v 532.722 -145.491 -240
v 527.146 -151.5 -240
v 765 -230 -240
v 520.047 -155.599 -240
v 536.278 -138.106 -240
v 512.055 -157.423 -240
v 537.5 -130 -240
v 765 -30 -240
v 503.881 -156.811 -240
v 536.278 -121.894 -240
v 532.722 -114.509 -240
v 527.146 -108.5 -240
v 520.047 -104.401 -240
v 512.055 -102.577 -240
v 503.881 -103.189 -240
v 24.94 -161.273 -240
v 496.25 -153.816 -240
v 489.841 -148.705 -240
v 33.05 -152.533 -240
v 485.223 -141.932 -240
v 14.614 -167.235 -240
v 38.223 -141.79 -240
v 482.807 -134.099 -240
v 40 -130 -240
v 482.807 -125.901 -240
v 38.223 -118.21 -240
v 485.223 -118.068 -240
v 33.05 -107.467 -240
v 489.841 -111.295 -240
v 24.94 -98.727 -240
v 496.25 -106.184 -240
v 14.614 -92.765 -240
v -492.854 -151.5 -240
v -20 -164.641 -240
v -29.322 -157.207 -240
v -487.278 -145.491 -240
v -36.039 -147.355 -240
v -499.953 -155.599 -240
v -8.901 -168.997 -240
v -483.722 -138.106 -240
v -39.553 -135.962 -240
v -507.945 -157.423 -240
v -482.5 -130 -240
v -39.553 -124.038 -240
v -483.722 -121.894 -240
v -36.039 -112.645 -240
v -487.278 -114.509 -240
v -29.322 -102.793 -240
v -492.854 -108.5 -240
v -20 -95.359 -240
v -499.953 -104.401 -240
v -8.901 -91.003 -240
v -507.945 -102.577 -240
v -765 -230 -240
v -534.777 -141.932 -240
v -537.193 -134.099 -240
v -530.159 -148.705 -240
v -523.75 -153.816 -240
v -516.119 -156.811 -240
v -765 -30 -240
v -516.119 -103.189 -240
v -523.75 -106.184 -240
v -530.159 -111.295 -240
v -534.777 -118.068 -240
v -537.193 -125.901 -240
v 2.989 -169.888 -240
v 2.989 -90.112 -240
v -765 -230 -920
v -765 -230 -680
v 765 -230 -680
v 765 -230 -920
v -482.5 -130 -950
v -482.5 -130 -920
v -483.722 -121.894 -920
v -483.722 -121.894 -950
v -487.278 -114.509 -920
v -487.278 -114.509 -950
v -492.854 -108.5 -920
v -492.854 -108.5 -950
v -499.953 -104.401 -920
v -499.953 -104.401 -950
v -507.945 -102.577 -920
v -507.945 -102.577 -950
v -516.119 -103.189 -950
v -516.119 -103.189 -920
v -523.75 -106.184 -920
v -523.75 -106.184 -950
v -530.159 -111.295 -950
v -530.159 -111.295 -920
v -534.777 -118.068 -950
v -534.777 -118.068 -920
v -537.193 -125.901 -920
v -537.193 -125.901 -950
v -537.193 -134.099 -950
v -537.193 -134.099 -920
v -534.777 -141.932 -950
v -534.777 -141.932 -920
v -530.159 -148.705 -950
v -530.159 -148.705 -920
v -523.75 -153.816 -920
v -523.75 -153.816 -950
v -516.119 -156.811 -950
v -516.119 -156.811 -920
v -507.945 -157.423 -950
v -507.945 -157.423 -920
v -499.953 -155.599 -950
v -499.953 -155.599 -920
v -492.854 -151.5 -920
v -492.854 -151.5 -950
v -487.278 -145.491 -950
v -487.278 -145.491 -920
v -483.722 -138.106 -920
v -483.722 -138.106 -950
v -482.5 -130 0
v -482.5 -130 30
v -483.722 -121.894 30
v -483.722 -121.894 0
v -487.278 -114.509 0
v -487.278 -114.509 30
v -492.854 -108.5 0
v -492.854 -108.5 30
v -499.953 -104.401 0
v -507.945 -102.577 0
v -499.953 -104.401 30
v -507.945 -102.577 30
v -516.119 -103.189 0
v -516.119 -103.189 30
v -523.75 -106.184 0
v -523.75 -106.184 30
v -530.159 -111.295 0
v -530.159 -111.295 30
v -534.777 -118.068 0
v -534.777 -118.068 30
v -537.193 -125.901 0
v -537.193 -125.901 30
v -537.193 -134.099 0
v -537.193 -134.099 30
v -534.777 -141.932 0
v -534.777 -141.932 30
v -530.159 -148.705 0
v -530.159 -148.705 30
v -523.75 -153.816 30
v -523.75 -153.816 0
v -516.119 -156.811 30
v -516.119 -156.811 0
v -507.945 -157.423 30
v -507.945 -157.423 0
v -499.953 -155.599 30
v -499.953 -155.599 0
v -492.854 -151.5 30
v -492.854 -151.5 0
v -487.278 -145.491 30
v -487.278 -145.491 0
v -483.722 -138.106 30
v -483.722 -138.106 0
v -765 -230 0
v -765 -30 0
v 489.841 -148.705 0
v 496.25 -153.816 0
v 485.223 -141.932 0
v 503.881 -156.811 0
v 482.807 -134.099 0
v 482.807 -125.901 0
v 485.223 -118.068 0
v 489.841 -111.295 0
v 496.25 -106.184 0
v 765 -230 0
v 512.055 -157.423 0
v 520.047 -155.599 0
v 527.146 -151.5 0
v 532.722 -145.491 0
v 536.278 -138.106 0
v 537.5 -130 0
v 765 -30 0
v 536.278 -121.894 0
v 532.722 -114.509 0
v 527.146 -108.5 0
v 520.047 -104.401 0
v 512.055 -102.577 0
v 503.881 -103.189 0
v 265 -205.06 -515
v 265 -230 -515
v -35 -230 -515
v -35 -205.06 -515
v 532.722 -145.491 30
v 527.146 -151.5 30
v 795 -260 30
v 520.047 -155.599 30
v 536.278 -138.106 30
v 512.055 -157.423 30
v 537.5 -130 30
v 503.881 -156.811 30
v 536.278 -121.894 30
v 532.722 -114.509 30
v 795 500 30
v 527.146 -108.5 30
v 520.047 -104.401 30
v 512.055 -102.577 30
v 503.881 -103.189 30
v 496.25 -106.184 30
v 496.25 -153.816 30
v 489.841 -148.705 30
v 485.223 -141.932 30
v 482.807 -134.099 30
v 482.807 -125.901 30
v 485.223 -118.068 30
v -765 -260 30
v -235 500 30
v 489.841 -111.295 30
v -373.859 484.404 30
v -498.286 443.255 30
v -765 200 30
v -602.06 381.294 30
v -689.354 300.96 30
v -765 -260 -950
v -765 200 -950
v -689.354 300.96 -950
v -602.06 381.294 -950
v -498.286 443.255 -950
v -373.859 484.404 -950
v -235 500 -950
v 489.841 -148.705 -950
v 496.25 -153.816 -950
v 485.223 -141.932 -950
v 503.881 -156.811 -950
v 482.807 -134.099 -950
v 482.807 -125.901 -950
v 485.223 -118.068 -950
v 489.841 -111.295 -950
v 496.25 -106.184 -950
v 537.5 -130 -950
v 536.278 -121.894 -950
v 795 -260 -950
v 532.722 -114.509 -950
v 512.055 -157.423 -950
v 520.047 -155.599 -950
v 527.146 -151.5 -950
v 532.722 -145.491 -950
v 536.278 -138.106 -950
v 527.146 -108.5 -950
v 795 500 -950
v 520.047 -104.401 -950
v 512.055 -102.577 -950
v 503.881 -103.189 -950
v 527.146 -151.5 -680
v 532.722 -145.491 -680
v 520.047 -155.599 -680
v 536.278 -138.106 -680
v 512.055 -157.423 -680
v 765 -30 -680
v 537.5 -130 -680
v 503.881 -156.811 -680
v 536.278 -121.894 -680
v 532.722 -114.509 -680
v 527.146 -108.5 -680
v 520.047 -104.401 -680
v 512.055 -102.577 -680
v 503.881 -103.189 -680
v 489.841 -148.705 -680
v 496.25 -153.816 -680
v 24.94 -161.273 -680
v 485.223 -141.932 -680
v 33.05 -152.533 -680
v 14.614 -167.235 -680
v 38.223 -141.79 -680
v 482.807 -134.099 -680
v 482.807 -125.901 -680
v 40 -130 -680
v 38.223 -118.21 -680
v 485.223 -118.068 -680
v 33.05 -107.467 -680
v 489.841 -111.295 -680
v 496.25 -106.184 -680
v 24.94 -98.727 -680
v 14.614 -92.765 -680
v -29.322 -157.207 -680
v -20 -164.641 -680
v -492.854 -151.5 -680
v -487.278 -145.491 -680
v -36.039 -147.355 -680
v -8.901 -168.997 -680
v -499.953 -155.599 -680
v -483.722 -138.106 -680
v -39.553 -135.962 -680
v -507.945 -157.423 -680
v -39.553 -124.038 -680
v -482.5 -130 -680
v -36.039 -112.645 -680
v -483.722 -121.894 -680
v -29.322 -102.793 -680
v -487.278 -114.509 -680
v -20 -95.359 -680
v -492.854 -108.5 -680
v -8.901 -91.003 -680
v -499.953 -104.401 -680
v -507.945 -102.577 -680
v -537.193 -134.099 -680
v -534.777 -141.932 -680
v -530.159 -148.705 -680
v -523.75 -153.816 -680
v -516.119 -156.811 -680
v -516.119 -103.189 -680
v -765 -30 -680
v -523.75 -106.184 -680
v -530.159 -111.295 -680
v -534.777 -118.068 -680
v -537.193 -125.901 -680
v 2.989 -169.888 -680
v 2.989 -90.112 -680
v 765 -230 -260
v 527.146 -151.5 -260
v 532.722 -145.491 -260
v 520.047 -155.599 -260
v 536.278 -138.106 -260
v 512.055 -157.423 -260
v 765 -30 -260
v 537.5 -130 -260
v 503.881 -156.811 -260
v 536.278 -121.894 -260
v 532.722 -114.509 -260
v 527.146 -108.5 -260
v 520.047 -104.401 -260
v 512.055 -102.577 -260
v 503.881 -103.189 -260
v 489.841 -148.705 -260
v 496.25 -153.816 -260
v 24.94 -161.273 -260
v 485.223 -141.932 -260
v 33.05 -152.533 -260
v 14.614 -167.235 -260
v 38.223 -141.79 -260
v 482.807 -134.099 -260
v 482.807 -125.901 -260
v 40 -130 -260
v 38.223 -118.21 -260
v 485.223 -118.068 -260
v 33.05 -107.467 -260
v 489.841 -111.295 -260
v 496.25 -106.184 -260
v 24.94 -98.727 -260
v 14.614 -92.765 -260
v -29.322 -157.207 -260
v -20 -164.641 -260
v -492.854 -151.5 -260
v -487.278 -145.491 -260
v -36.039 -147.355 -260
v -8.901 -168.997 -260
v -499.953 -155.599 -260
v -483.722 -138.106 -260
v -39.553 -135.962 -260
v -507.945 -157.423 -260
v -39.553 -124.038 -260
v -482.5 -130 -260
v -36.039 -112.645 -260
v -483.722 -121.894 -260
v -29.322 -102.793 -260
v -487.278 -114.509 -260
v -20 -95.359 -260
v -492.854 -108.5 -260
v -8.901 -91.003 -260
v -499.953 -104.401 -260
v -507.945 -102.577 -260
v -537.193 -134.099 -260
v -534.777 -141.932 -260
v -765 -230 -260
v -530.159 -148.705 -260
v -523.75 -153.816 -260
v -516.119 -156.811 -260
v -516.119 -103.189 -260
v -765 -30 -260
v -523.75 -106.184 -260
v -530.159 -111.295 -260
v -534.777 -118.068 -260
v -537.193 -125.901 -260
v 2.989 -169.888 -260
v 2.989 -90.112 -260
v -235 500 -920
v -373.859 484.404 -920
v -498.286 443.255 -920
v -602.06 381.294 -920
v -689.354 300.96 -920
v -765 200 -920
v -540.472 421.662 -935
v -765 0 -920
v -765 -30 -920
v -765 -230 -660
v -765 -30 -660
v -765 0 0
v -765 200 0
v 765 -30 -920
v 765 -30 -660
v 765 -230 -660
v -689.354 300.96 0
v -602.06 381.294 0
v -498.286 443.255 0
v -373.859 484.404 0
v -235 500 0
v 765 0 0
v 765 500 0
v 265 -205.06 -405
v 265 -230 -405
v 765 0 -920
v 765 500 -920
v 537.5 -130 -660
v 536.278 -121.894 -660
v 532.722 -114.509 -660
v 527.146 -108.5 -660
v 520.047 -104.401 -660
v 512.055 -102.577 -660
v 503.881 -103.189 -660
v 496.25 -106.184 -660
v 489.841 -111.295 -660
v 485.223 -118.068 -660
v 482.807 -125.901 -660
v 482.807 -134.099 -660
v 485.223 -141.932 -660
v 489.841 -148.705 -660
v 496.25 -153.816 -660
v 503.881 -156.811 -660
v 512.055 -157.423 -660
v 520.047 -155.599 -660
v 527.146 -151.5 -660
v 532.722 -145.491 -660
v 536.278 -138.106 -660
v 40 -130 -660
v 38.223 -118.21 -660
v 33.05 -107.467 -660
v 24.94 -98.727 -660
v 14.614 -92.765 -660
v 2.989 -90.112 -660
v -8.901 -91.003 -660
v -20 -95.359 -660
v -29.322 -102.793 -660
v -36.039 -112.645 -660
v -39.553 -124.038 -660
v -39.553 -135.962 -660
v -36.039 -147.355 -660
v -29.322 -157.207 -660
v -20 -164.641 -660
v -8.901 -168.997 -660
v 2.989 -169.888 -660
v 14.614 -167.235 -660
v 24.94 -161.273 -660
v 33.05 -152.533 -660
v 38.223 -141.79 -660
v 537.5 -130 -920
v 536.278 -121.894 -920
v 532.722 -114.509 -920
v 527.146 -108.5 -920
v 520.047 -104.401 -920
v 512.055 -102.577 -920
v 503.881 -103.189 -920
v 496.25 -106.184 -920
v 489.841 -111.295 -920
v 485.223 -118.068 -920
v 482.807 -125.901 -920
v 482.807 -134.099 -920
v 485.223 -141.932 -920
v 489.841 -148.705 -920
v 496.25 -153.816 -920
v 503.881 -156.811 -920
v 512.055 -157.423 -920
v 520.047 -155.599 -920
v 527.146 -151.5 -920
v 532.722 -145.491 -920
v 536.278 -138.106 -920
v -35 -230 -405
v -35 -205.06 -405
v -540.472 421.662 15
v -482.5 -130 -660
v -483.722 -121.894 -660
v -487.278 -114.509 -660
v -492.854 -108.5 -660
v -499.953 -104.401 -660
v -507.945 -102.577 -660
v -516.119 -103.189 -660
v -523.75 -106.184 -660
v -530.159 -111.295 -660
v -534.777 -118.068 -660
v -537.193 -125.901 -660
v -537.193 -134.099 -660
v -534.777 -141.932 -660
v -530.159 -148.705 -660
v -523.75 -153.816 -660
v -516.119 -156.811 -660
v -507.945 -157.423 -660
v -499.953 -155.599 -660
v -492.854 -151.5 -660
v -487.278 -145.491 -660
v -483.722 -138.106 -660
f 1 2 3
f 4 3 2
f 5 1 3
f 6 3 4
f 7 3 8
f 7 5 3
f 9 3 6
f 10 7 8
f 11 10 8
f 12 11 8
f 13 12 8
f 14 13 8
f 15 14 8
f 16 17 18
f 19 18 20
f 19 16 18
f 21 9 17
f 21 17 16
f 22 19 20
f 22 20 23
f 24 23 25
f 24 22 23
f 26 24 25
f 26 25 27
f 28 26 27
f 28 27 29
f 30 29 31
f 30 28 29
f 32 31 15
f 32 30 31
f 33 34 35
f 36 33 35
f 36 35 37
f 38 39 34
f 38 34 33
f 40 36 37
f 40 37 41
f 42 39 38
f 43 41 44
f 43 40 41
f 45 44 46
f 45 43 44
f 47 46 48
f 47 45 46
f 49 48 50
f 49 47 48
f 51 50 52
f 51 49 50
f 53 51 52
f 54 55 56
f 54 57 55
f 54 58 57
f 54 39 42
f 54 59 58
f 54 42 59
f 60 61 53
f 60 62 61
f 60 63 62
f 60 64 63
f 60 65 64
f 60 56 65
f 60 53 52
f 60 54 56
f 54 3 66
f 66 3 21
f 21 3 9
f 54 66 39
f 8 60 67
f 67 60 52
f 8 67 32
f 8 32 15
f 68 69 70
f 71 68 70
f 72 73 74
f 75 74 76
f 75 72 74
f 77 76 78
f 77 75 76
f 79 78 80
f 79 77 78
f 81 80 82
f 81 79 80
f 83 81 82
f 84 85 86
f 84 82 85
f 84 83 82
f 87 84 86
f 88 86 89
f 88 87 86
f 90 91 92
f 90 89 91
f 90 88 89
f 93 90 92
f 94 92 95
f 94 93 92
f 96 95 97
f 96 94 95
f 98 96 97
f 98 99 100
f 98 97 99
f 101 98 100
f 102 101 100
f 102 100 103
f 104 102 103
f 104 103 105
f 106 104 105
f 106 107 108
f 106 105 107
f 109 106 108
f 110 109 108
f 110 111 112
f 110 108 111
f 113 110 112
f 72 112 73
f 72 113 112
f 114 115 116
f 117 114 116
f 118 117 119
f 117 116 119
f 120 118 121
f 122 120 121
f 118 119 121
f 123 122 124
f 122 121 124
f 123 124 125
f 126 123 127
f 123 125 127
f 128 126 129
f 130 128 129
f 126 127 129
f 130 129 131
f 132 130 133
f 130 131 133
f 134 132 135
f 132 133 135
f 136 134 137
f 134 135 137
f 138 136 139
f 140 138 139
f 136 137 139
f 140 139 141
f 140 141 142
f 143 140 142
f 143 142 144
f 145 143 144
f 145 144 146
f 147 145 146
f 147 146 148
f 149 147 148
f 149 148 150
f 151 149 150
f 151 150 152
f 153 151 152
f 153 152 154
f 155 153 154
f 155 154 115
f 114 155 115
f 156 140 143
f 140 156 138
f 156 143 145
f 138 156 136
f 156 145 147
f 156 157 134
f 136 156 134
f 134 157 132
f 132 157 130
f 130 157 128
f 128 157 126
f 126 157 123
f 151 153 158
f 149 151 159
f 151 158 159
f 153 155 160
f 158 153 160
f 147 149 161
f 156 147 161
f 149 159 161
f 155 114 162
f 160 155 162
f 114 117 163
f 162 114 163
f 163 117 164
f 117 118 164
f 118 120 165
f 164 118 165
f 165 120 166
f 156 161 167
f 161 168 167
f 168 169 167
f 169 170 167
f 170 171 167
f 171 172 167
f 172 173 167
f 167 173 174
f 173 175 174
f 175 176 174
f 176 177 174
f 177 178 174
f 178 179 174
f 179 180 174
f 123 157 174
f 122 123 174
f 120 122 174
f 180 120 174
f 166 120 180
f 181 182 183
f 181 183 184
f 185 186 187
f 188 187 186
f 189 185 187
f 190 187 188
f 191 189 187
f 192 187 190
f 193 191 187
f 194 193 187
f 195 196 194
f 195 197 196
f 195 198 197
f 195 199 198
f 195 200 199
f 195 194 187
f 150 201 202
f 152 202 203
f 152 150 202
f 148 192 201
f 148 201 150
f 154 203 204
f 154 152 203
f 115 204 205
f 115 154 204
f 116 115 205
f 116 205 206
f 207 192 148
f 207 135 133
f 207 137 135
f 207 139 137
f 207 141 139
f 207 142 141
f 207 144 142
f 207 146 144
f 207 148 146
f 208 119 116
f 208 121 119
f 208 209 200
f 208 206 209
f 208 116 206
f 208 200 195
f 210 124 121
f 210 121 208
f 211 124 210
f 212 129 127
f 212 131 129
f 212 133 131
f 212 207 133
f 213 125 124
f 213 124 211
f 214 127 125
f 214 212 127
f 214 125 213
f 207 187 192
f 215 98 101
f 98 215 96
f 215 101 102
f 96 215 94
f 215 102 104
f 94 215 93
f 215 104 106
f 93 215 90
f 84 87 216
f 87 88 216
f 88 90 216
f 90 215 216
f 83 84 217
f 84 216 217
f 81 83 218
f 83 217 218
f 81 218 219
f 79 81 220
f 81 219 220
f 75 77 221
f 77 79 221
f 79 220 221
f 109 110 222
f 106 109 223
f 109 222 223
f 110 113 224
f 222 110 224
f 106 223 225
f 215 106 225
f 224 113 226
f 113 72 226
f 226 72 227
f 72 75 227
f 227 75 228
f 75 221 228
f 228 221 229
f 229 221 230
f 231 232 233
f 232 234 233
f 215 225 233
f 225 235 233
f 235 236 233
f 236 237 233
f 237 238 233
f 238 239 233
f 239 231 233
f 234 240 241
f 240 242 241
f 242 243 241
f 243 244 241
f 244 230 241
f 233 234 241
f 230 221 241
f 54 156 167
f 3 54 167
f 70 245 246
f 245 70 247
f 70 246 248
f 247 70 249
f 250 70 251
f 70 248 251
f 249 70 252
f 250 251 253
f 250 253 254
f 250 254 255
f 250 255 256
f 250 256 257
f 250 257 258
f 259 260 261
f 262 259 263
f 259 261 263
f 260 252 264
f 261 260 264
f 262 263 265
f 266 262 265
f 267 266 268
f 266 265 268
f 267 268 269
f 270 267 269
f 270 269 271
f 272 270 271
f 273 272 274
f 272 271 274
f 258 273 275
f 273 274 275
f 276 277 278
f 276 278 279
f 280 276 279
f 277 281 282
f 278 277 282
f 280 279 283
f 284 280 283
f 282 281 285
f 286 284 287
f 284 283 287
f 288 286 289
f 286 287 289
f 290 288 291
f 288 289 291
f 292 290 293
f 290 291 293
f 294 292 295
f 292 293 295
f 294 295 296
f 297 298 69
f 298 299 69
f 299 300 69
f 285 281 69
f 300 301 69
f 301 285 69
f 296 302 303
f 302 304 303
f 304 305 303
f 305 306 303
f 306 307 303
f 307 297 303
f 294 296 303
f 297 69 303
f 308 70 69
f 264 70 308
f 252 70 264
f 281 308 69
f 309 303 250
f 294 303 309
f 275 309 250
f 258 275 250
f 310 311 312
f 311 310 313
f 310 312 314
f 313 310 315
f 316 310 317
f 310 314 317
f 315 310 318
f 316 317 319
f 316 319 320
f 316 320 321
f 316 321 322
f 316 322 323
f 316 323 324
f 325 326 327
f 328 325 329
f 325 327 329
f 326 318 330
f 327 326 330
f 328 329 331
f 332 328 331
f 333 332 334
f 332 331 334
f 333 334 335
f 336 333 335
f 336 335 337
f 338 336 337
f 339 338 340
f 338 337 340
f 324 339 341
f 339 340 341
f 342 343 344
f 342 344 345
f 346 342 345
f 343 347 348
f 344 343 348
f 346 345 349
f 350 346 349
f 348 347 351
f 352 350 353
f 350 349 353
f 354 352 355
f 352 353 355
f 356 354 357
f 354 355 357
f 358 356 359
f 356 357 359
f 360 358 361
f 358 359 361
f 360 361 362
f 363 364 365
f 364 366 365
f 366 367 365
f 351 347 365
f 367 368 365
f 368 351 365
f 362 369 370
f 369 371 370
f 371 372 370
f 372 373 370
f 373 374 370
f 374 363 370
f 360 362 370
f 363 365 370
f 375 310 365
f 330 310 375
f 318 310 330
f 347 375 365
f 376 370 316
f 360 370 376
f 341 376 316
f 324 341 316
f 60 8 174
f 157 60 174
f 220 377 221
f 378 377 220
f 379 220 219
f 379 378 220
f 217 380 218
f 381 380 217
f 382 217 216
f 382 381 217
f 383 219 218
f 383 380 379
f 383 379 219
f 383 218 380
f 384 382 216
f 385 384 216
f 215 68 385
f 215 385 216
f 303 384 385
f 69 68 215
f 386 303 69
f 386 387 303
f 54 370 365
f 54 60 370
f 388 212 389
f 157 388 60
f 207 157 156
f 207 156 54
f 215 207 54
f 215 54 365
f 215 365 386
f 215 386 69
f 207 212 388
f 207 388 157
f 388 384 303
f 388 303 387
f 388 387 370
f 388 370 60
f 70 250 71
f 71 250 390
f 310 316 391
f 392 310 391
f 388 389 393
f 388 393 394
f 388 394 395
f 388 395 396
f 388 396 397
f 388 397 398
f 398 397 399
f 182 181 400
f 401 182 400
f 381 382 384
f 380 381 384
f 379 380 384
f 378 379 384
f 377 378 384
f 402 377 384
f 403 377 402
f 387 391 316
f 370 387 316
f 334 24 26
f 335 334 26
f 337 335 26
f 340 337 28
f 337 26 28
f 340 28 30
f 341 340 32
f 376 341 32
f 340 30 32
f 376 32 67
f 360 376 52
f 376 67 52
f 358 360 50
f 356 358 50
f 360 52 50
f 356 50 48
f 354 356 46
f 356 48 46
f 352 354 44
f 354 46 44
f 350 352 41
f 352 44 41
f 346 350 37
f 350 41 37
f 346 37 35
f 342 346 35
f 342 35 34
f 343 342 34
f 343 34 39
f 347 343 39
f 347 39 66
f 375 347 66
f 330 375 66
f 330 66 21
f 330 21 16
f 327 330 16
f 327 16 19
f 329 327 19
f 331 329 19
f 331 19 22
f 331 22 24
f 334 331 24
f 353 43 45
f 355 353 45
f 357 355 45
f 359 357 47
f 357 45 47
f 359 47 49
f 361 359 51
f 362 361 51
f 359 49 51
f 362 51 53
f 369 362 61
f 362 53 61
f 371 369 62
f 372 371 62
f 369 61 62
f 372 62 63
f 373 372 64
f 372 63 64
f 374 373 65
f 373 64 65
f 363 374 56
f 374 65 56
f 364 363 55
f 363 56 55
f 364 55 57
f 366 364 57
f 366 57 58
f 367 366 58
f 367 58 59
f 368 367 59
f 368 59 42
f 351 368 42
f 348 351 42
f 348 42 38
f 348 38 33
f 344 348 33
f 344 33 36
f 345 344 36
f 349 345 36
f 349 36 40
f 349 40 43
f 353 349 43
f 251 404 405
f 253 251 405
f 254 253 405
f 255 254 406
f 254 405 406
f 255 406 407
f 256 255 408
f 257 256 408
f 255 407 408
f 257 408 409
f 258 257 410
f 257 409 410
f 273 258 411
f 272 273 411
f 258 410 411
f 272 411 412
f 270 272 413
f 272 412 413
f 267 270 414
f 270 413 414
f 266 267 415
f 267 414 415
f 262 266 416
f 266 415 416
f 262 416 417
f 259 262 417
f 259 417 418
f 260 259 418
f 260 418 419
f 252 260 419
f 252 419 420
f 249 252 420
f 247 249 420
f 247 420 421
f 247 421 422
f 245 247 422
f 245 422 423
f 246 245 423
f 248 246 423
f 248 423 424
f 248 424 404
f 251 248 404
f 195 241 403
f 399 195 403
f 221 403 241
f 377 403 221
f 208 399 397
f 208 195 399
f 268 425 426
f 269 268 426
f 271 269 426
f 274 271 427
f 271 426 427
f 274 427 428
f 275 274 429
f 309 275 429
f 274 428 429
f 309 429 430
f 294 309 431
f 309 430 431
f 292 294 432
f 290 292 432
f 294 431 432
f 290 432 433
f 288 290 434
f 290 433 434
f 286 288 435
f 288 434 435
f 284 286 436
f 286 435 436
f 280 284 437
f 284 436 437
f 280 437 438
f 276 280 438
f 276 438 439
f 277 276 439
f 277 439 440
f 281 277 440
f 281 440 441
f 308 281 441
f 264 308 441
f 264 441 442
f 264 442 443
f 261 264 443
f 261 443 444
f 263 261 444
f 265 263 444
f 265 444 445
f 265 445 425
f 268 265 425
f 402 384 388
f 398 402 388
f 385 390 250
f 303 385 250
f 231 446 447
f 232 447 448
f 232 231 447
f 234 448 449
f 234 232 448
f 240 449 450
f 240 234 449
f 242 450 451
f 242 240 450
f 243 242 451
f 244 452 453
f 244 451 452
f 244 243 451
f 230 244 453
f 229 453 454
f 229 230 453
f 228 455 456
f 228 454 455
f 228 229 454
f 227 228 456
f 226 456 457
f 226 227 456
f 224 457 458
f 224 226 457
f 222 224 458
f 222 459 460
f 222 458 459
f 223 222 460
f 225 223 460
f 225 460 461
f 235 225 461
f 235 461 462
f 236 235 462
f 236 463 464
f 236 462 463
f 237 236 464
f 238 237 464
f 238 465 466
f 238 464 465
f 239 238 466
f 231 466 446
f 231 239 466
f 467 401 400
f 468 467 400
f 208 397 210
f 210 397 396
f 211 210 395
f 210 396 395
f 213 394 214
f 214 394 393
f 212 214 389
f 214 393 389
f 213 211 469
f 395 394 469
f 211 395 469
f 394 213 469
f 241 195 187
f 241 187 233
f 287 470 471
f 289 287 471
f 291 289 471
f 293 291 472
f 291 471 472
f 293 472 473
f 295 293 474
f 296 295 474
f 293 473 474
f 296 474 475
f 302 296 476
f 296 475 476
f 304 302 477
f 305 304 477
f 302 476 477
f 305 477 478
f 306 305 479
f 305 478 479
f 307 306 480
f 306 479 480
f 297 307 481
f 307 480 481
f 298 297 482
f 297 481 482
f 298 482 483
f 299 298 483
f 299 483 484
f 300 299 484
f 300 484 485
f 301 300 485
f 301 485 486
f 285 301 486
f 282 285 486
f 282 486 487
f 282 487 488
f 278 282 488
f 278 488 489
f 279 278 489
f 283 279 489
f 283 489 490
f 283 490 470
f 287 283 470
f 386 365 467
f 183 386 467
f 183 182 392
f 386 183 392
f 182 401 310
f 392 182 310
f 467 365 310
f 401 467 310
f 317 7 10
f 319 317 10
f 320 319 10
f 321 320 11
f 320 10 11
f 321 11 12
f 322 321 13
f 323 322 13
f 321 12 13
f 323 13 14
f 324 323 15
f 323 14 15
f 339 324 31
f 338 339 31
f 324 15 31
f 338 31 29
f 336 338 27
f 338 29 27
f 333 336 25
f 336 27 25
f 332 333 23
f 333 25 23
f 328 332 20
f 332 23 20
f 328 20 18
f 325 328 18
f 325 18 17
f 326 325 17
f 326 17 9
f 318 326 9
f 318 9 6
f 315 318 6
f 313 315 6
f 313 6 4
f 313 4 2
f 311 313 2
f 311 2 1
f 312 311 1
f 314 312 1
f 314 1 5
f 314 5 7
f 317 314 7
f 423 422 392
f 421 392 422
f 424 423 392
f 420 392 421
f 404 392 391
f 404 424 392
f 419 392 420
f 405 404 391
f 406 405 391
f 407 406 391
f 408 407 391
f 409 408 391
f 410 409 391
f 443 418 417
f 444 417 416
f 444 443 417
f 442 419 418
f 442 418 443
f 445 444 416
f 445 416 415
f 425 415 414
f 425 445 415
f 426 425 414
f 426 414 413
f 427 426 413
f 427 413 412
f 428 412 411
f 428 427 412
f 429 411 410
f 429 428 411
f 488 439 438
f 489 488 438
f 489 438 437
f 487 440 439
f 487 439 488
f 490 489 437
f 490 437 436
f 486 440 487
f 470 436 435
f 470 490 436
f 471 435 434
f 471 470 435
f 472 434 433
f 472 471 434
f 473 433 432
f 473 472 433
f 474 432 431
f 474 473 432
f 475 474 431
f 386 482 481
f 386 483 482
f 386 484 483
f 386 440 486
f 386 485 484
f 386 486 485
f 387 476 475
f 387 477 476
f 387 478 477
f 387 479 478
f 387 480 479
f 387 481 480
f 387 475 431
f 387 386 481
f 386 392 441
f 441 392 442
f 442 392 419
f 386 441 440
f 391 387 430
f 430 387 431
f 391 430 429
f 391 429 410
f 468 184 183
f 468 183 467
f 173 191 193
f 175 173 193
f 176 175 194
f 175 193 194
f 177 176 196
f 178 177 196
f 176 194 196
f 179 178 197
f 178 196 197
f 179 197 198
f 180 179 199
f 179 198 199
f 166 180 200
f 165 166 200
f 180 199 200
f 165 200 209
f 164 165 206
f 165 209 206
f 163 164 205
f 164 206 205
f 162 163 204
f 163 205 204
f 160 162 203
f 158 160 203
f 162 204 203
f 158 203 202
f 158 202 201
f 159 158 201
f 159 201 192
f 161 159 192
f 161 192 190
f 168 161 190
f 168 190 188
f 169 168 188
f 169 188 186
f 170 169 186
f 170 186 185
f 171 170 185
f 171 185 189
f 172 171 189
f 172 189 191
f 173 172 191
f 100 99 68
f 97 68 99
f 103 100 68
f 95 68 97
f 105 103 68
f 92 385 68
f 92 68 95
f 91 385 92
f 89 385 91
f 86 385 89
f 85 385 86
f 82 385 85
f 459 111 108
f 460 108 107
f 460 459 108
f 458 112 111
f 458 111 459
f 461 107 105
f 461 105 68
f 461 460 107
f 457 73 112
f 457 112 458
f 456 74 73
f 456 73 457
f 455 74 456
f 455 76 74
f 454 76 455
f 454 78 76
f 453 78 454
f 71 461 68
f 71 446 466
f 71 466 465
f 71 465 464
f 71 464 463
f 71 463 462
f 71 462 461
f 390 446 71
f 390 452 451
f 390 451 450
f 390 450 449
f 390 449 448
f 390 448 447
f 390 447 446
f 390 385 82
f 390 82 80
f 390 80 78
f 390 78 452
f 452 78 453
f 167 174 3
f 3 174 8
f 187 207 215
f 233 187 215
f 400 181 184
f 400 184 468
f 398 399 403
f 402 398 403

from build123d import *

# Parameters (mm, degrees)
SKETCH1_W           = 1530
SKETCH1_H           = 230
BOSS_EXTRUDE3_DEPTH = 30
SKETCH9_R           = 27.5
CUT_EXTRUDE1_DEPTH  = 31.0000001
SKETCH10_W          = 1530
SKETCH10_H          = 980
BOSS_EXTRUDE4_DEPTH = 30
SKETCH11_W          = 980
SKETCH11_H          = 760
BOSS_EXTRUDE5_DEPTH = 30
SKETCH12_W          = 920
SKETCH12_H          = 30
BOSS_EXTRUDE6_DEPTH = 1530
SKETCH13_W          = 20
SKETCH13_H          = 200
BOSS_EXTRUDE7_DEPTH = 1530
SKETCH14_R          = 27.5
SKETCH14_R_2        = 40
CUT_EXTRUDE3_DEPTH  = 500
BOSS_EXTRUDE8_START = 500
SKETCH17_W          = 110
SKETCH17_H          = 24.94
BOSS_EXTRUDE8_DEPTH = 300


with BuildPart() as part:
    # Sketch1 → Boss-Extrude3 (new body)
    with BuildSketch(Plane.XY):
        with BuildLine():
            Line((765, 500), (-235, 500))
            add(Edge.make_bspline(
                [(-235, 500), (-580.943747407, 493.32484482), (-765, 200)],
                knots=[0, 0, 0, 1, 1, 1], degree=2))
            Line((-765, 200), (-765, 0))
            Line((-765, 0), (765, 0))
            Line((765, 0), (765, 500))
        make_face()
        with Locations((0, -115)):
            Rectangle(SKETCH1_W, SKETCH1_H)
    boss_extrude3 = extrude(amount=BOSS_EXTRUDE3_DEPTH)

    # Sketch9 → Cut-Extrude1 (cut, through all)
    with BuildSketch(Plane.XY.offset(30)):
        with Locations((-510, -130)):
            Circle(SKETCH9_R)
        with Locations((510, -130)):
            Circle(SKETCH9_R)
    cut_extrude1 = extrude(amount=-CUT_EXTRUDE1_DEPTH, mode=Mode.SUBTRACT)

    # Sketch10 → Boss-Extrude4 (add)
    with BuildSketch(Plane.XZ.offset(230)):
        with Locations((0, -460)):
            Rectangle(SKETCH10_W, SKETCH10_H)
    extrude(amount=BOSS_EXTRUDE4_DEPTH)

    # Sketch11 → Boss-Extrude5 (add)
    with BuildSketch(Plane(origin=(765, 0, 0), x_dir=(0, 0, -1), z_dir=(1, 0, 0))):
        with Locations((460, 120)):
            Rectangle(SKETCH11_W, SKETCH11_H)
    boss_extrude5 = extrude(amount=BOSS_EXTRUDE5_DEPTH)

    # Mirror3: Boss-Extrude3, Cut-Extrude1, Boss-Extrude5 across plane
    add(boss_extrude3.mirror(Plane.XY.offset(-460)))
    add(cut_extrude1.mirror(Plane.XY.offset(-460)), mode=Mode.SUBTRACT)
    add(boss_extrude5.mirror(Plane.XY.offset(-460)))

    # Sketch12 → Boss-Extrude6 (add)
    with BuildSketch(Plane.ZY.offset(-765)):
        with Locations((-460, -15)):
            Rectangle(SKETCH12_W, SKETCH12_H)
    extrude(amount=BOSS_EXTRUDE6_DEPTH)

    # Sketch13 → Boss-Extrude7 (add)
    with BuildSketch(Plane.ZY.offset(765)):
        with Locations((-670, -130)):
            Rectangle(SKETCH13_W, SKETCH13_H)
        with Locations((-250, -130)):
            Rectangle(SKETCH13_W, SKETCH13_H)
    extrude(amount=-BOSS_EXTRUDE7_DEPTH)

    # Sketch14 → Cut-Extrude3 (cut)
    with BuildSketch(Plane.XY.offset(-240)):
        with Locations((-510, -130)):
            Circle(SKETCH14_R)
        with Locations((0, -130)):
            Circle(SKETCH14_R_2)
        with Locations((510, -130)):
            Circle(SKETCH14_R)
    extrude(amount=-CUT_EXTRUDE3_DEPTH, mode=Mode.SUBTRACT)

    # Sketch17 → Boss-Extrude8 (add)
    with BuildSketch(Plane.ZY.offset(-765).offset(BOSS_EXTRUDE8_START)):
        with Locations((-460, -217.53)):
            Rectangle(SKETCH17_W, SKETCH17_H)
    extrude(amount=BOSS_EXTRUDE8_DEPTH)


solid = part.part
